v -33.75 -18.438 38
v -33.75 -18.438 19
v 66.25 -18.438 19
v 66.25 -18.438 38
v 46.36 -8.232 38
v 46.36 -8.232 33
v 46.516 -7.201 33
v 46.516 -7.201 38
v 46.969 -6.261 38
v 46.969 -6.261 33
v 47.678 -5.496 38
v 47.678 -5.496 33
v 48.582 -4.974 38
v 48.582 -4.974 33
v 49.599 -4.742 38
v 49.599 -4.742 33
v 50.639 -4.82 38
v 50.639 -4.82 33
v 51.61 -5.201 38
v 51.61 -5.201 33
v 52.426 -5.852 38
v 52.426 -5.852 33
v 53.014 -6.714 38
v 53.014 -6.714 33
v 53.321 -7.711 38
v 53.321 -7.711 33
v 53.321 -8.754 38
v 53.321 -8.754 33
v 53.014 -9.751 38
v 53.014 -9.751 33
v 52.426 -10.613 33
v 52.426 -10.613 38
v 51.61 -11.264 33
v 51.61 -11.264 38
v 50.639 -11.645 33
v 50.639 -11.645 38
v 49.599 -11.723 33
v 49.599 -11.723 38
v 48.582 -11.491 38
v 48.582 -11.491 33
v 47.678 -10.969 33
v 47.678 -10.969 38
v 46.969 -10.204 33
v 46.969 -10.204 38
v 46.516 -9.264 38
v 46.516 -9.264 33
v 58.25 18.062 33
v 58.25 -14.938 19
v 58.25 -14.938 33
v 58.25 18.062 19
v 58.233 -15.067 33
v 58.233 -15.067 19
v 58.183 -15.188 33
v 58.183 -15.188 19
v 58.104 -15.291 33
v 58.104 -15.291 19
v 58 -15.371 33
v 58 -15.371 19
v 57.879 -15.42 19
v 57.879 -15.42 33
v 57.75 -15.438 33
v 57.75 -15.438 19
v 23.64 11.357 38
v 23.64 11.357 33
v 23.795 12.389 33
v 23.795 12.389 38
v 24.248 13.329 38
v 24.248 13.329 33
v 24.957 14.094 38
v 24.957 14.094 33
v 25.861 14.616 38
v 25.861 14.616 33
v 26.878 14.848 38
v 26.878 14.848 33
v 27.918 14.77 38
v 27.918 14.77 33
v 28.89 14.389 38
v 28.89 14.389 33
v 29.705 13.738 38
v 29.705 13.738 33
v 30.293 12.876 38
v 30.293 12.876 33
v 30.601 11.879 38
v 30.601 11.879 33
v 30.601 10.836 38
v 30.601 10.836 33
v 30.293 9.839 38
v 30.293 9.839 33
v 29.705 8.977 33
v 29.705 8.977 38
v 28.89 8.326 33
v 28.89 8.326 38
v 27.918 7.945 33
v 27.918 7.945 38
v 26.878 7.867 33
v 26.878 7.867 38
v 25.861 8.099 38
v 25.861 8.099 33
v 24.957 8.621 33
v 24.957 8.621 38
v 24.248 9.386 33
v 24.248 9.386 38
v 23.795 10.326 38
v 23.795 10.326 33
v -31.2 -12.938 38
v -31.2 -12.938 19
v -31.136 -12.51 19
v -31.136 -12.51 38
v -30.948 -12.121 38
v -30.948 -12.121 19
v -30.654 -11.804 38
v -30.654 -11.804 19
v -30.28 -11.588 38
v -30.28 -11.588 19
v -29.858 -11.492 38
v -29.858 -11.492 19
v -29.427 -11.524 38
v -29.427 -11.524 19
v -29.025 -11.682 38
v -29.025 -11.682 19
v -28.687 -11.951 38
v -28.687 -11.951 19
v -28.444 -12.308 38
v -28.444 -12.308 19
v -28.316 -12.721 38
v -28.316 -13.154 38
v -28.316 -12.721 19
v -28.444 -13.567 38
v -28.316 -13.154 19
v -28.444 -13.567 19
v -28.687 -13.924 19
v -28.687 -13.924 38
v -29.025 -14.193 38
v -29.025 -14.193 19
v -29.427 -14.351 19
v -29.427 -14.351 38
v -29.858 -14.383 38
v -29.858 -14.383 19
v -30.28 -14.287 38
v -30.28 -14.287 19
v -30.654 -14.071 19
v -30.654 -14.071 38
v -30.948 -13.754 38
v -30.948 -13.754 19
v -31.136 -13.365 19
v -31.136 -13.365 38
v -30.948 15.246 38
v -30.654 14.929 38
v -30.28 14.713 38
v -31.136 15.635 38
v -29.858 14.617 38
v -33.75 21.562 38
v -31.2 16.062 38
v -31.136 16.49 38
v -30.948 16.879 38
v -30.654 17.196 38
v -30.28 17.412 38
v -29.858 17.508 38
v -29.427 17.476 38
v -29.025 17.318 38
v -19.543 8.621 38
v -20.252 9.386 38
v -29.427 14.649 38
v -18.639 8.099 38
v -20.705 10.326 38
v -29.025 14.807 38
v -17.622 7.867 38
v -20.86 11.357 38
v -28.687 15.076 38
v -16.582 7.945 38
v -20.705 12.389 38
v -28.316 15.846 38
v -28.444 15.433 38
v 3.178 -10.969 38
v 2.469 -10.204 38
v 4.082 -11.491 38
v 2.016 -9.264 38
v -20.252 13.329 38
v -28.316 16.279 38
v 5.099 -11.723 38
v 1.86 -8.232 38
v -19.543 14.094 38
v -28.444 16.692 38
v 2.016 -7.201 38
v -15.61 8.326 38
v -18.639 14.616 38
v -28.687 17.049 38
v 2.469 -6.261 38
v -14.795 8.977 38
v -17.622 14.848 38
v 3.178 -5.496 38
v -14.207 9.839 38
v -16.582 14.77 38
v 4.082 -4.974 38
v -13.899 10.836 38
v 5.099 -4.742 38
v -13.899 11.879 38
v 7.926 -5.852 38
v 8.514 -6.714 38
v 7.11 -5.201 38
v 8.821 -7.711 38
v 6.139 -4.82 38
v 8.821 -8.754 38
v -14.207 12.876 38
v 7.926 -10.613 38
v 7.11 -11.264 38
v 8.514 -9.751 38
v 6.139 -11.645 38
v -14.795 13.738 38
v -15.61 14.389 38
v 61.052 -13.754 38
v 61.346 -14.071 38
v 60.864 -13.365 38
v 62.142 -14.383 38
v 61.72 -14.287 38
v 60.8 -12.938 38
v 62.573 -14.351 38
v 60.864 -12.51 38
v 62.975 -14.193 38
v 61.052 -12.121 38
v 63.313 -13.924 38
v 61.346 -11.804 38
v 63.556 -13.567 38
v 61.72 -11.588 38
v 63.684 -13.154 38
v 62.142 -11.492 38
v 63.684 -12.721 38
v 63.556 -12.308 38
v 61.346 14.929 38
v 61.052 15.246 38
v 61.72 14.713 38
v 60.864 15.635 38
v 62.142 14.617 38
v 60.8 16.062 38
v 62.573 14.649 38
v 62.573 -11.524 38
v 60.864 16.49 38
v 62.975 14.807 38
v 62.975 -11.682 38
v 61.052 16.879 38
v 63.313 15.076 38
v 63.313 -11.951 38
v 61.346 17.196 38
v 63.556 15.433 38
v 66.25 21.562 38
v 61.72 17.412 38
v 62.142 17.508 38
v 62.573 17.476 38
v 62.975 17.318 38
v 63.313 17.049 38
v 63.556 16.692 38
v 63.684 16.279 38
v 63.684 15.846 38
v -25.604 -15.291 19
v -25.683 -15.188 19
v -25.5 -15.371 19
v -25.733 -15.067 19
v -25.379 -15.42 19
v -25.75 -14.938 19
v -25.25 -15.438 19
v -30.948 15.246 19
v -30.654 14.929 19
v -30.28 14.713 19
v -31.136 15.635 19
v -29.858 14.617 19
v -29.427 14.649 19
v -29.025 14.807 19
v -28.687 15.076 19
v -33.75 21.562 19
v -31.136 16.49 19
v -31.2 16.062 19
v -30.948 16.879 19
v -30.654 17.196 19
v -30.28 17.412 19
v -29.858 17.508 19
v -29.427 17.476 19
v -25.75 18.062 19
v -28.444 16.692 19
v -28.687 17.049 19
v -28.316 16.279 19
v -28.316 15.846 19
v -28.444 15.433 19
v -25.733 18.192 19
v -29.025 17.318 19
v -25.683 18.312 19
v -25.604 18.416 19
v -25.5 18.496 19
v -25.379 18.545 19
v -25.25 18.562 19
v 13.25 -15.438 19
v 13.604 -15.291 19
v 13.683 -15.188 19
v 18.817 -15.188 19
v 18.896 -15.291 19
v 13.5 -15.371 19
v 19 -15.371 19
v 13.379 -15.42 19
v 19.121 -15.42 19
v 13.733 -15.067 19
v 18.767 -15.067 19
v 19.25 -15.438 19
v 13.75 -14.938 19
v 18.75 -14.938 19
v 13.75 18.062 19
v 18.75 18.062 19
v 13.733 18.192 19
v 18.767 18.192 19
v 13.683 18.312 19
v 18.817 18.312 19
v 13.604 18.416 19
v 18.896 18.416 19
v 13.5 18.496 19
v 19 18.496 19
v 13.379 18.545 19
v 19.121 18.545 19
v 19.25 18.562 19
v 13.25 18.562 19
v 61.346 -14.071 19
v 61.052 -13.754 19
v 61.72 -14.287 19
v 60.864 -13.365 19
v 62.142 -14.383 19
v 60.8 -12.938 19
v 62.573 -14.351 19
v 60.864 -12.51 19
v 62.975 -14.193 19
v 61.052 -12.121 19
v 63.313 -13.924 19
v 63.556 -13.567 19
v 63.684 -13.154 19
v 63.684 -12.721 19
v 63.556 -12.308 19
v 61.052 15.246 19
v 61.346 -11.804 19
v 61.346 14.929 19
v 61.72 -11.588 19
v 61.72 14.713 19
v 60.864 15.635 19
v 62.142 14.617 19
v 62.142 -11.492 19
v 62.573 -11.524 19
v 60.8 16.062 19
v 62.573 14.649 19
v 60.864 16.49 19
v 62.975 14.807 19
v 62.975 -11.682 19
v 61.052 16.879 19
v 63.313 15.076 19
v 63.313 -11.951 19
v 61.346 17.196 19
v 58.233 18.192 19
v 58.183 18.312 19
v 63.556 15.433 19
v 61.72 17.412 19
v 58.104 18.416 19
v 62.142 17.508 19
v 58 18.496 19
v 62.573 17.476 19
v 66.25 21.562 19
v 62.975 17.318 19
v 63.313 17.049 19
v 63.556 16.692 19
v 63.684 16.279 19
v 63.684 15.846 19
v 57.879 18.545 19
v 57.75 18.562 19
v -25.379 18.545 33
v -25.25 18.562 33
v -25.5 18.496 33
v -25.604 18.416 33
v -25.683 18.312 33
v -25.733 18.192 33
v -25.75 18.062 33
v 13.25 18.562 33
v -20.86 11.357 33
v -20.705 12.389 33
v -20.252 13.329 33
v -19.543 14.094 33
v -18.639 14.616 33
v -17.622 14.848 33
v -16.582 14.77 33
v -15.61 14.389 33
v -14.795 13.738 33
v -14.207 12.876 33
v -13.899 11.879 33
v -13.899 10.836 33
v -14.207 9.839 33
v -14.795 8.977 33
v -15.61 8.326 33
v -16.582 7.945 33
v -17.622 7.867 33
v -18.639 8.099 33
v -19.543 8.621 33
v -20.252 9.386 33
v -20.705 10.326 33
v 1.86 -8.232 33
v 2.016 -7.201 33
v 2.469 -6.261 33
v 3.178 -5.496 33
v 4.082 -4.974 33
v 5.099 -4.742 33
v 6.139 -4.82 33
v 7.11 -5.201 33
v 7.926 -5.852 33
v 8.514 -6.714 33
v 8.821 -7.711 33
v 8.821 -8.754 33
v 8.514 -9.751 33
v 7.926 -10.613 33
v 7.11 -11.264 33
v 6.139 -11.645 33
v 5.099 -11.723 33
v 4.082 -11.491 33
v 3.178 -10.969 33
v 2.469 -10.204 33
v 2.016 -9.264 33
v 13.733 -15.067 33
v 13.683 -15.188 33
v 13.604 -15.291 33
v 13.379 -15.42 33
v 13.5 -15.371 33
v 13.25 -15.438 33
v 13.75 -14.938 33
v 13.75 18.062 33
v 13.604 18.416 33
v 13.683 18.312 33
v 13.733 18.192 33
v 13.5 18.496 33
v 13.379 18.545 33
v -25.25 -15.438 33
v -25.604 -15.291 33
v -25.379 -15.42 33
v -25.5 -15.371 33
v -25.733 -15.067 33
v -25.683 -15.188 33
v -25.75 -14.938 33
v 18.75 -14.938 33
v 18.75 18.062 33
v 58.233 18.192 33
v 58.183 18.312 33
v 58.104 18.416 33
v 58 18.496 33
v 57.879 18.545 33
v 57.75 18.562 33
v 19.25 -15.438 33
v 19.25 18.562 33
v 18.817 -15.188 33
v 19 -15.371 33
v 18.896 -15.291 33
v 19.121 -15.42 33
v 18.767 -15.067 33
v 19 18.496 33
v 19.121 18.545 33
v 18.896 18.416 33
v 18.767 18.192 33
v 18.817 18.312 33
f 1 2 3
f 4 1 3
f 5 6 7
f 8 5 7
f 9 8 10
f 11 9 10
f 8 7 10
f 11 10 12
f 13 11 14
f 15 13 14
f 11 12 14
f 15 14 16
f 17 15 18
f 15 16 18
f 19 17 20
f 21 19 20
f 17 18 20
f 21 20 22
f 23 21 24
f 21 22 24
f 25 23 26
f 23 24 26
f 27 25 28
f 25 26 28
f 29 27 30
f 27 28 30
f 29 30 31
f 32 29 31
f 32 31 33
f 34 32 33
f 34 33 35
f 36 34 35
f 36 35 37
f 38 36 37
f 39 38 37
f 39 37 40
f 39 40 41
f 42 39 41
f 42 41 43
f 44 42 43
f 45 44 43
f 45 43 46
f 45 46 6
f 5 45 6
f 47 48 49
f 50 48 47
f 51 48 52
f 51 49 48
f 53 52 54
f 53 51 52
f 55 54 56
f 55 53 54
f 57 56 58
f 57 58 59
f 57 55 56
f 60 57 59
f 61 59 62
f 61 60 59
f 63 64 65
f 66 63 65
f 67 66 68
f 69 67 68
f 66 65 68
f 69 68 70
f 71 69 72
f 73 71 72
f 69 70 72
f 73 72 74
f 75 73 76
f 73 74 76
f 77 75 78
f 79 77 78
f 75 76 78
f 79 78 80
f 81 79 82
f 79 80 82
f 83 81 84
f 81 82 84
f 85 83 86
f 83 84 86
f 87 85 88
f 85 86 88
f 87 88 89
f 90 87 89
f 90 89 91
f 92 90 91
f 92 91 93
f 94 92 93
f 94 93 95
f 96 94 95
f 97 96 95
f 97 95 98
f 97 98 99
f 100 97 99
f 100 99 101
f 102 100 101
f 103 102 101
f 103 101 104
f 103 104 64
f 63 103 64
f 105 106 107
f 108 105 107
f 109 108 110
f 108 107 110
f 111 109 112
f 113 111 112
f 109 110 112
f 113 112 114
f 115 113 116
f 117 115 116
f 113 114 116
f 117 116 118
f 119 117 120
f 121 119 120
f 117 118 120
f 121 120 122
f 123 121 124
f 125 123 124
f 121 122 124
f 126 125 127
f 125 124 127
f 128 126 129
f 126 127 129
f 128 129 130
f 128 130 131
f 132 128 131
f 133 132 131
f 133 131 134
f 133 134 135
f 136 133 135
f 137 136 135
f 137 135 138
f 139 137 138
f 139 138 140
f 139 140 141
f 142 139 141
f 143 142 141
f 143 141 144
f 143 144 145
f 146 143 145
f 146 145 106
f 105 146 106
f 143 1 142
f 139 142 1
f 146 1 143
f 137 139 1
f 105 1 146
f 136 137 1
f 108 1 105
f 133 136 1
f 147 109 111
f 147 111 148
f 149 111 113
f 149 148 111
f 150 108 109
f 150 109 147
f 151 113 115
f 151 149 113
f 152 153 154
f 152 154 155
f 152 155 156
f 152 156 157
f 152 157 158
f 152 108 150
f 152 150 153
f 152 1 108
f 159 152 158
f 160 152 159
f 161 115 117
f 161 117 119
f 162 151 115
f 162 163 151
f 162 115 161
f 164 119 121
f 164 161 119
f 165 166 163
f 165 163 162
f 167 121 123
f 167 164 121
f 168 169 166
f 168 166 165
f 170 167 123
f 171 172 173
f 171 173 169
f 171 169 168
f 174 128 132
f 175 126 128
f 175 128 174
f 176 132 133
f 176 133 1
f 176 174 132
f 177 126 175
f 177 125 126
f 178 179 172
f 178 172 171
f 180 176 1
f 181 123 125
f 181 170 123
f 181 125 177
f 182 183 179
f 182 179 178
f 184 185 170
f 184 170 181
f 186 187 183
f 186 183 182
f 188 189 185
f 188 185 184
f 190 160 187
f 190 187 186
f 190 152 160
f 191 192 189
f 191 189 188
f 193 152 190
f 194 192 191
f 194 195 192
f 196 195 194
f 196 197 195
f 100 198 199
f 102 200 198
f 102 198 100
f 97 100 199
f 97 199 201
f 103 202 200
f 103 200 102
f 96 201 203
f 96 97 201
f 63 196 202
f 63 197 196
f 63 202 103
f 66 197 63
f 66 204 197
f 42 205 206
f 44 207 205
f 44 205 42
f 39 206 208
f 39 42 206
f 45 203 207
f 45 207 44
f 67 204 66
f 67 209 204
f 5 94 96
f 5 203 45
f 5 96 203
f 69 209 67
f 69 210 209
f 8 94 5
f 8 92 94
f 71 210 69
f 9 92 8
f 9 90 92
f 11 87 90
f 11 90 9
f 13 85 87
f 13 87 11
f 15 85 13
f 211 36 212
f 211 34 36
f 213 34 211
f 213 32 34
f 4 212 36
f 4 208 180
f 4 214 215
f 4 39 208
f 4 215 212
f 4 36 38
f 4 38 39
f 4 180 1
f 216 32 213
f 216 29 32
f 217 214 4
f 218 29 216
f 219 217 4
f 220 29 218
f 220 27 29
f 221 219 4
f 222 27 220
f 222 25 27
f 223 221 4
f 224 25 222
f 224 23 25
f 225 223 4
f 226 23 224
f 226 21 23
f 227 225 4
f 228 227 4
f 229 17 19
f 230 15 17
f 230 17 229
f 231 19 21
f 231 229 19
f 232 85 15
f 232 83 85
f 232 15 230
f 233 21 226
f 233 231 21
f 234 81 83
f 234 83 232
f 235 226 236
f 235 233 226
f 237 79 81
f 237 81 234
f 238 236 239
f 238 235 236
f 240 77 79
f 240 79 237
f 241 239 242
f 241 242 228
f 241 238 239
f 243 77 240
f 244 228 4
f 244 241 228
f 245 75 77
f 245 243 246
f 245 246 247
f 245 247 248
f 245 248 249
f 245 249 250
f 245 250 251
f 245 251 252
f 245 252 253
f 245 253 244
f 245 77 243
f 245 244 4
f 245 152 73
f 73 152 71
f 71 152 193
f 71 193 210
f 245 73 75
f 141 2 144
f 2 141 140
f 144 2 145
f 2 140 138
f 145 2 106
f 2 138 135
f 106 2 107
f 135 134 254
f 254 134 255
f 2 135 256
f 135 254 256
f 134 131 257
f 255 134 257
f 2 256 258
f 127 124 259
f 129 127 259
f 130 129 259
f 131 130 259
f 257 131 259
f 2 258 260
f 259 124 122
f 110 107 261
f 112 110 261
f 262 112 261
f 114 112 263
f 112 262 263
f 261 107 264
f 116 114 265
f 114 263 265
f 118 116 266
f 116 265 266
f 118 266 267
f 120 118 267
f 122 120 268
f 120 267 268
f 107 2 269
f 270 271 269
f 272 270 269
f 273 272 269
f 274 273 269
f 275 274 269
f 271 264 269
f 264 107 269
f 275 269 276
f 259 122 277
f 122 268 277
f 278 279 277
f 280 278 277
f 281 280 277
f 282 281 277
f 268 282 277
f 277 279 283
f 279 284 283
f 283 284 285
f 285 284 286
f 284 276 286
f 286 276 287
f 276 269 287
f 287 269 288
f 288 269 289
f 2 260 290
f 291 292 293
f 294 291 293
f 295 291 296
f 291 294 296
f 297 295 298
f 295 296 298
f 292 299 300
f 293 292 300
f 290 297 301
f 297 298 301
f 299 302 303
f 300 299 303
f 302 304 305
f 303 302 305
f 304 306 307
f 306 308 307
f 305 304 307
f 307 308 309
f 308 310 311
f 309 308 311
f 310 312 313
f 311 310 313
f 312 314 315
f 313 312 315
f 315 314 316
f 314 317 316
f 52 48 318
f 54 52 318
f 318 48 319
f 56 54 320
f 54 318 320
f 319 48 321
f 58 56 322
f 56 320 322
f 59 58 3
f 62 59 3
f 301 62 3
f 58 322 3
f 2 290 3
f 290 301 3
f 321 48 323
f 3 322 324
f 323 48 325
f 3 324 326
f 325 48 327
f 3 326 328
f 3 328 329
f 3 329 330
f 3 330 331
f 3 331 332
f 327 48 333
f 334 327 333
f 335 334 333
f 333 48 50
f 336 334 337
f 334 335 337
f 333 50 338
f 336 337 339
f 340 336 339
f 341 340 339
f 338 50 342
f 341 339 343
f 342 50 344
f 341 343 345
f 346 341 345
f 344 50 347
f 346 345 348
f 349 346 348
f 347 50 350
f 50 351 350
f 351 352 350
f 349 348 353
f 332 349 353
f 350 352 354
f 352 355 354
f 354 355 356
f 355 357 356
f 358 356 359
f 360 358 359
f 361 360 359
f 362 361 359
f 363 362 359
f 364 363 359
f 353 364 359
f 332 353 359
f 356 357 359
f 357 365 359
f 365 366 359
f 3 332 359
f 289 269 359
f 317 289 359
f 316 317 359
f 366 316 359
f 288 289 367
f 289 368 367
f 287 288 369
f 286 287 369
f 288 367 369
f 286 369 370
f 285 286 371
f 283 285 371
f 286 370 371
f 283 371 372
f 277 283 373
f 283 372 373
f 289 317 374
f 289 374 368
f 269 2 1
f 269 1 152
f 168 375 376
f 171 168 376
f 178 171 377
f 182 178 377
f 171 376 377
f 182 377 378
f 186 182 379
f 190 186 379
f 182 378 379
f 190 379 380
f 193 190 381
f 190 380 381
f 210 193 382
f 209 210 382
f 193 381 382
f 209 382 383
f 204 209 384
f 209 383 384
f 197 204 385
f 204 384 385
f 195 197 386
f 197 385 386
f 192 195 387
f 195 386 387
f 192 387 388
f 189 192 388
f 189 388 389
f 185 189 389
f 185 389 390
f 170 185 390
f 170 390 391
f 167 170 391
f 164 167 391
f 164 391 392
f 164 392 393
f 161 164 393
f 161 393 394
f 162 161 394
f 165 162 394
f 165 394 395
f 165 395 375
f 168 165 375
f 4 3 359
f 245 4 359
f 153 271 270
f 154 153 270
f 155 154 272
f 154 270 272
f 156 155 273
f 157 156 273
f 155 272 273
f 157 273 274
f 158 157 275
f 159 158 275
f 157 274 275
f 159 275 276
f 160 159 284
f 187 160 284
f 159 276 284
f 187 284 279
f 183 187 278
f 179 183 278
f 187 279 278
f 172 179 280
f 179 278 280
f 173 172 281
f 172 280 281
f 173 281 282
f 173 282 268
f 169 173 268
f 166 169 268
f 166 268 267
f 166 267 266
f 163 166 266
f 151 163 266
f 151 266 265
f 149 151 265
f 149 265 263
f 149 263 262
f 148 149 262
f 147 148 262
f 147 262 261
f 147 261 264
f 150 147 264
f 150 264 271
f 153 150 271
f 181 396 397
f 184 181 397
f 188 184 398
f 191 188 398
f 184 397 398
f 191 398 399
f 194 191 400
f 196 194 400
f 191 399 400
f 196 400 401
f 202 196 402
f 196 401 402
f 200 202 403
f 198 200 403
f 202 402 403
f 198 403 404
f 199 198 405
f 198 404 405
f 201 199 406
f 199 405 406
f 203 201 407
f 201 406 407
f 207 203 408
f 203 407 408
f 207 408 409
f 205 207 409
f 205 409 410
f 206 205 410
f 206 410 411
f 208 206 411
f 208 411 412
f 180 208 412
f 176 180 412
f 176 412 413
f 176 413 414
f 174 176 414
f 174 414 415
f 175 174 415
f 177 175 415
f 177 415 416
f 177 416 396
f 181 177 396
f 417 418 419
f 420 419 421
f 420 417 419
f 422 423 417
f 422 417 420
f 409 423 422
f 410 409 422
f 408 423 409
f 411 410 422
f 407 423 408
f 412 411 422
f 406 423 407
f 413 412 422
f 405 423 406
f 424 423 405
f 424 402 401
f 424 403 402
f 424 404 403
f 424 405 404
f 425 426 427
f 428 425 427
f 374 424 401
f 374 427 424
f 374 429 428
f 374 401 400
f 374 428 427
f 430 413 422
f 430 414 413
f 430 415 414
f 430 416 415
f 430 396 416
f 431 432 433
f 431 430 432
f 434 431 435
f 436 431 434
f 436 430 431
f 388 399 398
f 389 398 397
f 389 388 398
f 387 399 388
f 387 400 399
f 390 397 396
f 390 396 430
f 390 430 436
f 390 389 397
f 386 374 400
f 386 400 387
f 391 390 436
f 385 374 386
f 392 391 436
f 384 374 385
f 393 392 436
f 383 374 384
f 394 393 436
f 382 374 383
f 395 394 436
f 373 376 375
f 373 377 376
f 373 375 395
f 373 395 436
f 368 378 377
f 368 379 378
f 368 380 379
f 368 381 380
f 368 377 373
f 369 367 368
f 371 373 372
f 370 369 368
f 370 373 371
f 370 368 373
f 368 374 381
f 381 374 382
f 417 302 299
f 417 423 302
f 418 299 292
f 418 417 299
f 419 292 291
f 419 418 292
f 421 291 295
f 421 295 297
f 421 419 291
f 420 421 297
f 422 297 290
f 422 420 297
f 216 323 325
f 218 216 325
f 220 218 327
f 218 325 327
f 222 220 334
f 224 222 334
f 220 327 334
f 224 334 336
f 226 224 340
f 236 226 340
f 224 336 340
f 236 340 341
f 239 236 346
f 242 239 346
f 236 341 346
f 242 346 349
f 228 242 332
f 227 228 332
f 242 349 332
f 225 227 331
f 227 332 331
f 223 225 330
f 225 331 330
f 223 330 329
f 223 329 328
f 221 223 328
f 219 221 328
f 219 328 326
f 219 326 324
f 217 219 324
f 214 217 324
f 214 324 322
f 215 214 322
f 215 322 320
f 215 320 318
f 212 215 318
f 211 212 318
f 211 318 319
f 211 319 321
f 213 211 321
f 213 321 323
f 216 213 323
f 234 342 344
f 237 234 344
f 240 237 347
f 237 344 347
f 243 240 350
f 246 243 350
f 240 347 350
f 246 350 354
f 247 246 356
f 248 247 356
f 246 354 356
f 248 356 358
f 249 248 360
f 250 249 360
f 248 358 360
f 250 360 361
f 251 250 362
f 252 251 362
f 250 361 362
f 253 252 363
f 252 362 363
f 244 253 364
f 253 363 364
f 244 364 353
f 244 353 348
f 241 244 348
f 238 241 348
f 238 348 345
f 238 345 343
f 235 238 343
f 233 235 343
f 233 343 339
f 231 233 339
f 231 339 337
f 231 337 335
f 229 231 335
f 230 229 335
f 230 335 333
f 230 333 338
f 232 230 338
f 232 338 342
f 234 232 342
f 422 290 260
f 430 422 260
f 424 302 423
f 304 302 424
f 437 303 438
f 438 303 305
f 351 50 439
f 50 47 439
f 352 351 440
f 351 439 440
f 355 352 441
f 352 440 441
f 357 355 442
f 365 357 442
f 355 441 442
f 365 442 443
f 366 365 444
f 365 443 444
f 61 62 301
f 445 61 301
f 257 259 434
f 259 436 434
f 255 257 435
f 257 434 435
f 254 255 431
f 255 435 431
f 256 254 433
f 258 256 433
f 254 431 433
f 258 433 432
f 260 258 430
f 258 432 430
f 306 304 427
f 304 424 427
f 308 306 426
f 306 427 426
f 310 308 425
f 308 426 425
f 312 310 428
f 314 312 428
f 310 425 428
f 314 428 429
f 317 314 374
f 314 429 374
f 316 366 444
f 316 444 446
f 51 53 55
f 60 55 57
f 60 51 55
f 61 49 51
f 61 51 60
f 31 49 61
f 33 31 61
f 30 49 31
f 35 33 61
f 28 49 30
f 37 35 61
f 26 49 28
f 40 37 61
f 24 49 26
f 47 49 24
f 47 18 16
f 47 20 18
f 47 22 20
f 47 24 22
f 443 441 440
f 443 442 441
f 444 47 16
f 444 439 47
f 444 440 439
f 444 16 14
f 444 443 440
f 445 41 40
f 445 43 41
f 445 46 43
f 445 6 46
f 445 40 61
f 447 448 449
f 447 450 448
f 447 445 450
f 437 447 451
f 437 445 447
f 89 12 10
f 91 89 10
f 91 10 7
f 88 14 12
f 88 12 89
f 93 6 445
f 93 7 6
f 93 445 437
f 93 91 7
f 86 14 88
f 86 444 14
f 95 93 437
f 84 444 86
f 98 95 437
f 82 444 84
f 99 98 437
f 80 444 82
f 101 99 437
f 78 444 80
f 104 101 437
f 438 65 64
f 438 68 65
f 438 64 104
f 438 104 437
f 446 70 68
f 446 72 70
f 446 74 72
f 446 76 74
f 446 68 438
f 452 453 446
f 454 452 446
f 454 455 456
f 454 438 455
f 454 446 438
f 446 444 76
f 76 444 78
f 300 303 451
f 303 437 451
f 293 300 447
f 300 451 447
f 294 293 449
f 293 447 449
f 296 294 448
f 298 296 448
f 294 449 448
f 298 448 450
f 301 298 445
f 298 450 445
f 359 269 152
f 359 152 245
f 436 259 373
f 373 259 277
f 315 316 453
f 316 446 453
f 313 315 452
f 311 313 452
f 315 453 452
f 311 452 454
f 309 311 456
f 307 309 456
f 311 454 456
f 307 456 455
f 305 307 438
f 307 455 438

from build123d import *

# Parameters (mm, degrees)
SKETCH1_W           = 100
SKETCH1_H           = 40
BOSS_EXTRUDE1_DEPTH = 38
CUT_EXTRUDE2_START  = -12
SKETCH2_W           = 39.5
SKETCH2_H           = 34
CUT_EXTRUDE2_DEPTH  = 21
CUT_EXTRUDE3_DEPTH  = 9
CUT_EXTRUDE4_REACH  = 81.36
SKETCH4_R           = 1.45
SKETCH5_W           = 100
SKETCH5_H           = 19
CUT_EXTRUDE5_DEPTH  = 87.215210375
FILLET1_R           = 0.5
CUT_EXTRUDE11_REACH = 73.063
SKETCH10_R          = 3.5


with BuildPart() as part:
    # Sketch1 → Boss-Extrude1 (new body)
    with BuildSketch(Plane.XY):
        with Locations((16.25, 1.5625)):
            Rectangle(SKETCH1_W, SKETCH1_H)
    extrude(amount=BOSS_EXTRUDE1_DEPTH)

    # Sketch2 → Cut-Extrude2 (cut)
    with BuildSketch(Plane(origin=(0, 0, 0), x_dir=(-1, 0, 0), z_dir=(0, 0, -1)).offset(CUT_EXTRUDE2_START)):
        with Locations((-38.5, 1.5625)):
            Rectangle(SKETCH2_W, SKETCH2_H)
        with Locations((6, 1.5625)):
            Rectangle(SKETCH2_W, SKETCH2_H)
    extrude(amount=-CUT_EXTRUDE2_DEPTH, mode=Mode.SUBTRACT)

    # Sketch3 → Cut-Extrude3 (cut)
    with BuildSketch(Plane(origin=(-3.362318072, 0, 0), x_dir=(-1, 0, 0), z_dir=(0, 0, -1))):
        with BuildLine():
            ThreePointArc((-61.593370612, 1.614325749), (-20.676836723, -17.421621422), (21.715969185, -1.949710178))
            ThreePointArc((21.715969185, -1.949710178), (22.204299442, 9.465009595), (10.78957967, 9.953339852))
            ThreePointArc((10.78957967, 9.953339852), (-19.986233449, -1.278769909), (-49.690320582, 12.540715264))
            ThreePointArc((-49.690320582, 12.540715264), (-61.105040355, 13.029045522), (-61.593370612, 1.614325749))
        make_face()
    extrude(amount=-CUT_EXTRUDE3_DEPTH, mode=Mode.SUBTRACT)

    # Sketch4 → Cut-Extrude4 (cut, up to next)
    with BuildSketch(Plane(origin=(0, 0, 0), x_dir=(-1, 0, 0), z_dir=(0, 0, -1)), mode=Mode.PRIVATE) as cut_extrude4_sk1:
        with Locations((-62.25, 16.0625)):
            Circle(SKETCH4_R)
    cut_extrude4_tool1 = extrude(cut_extrude4_sk1.sketch, amount=-CUT_EXTRUDE4_REACH, mode=Mode.PRIVATE) & part.part
    # Sketch4 → Cut-Extrude4 (cut, up to next)
    with BuildSketch(Plane(origin=(0, 0, 0), x_dir=(-1, 0, 0), z_dir=(0, 0, -1)), mode=Mode.PRIVATE) as cut_extrude4_sk2:
        with Locations((-62.25, -12.9375)):
            Circle(SKETCH4_R)
    cut_extrude4_tool2 = extrude(cut_extrude4_sk2.sketch, amount=-CUT_EXTRUDE4_REACH, mode=Mode.PRIVATE) & part.part
    # Sketch4 → Cut-Extrude4 (cut, up to next)
    with BuildSketch(Plane(origin=(0, 0, 0), x_dir=(-1, 0, 0), z_dir=(0, 0, -1)), mode=Mode.PRIVATE) as cut_extrude4_sk3:
        with Locations((29.75, 16.0625)):
            Circle(SKETCH4_R)
    cut_extrude4_tool3 = extrude(cut_extrude4_sk3.sketch, amount=-CUT_EXTRUDE4_REACH, mode=Mode.PRIVATE) & part.part
    # Sketch4 → Cut-Extrude4 (cut, up to next)
    with BuildSketch(Plane(origin=(0, 0, 0), x_dir=(-1, 0, 0), z_dir=(0, 0, -1)), mode=Mode.PRIVATE) as cut_extrude4_sk4:
        with Locations((29.75, -12.9375)):
            Circle(SKETCH4_R)
    cut_extrude4_tool4 = extrude(cut_extrude4_sk4.sketch, amount=-CUT_EXTRUDE4_REACH, mode=Mode.PRIVATE) & part.part
    add(cut_extrude4_tool1.solids().sort_by_distance((62.25, 16.0625, 0))[0], mode=Mode.SUBTRACT)
    add(cut_extrude4_tool2.solids().sort_by_distance((62.25, -12.9375, 0))[0], mode=Mode.SUBTRACT)
    add(cut_extrude4_tool3.solids().sort_by_distance((-29.75, 16.0625, 0))[0], mode=Mode.SUBTRACT)
    add(cut_extrude4_tool4.solids().sort_by_distance((-29.75, -12.9375, 0))[0], mode=Mode.SUBTRACT)

    # Sketch5 → Cut-Extrude5 (cut, through all)
    with BuildSketch(Plane(origin=(0, 21.5625, 0), x_dir=(1, 0, 0), z_dir=(0, 1, 0))):
        with Locations((16.25, -9.5)):
            Rectangle(SKETCH5_W, SKETCH5_H)
    extrude(amount=-CUT_EXTRUDE5_DEPTH, mode=Mode.SUBTRACT)

    # Fillet1
    fillet1_edges = [part.edges().sort_by_distance(p)[0] for p in [
        (58.25, 18.5625, 26),
        (18.75, 18.5625, 26),
        (18.75, -15.4375, 26),
        (58.25, -15.4375, 26),
        (13.75, 18.5625, 26),
        (-25.75, 18.5625, 26),
        (-25.75, -15.4375, 26),
        (13.75, -15.4375, 26),
    ]]
    fillet(fillet1_edges, radius=FILLET1_R)

    # Sketch10 → Cut-Extrude11 (cut, up to next)
    with BuildSketch(Plane(origin=(0, 0, 33), x_dir=(-1, 0, 0), z_dir=(0, 0, -1)), mode=Mode.PRIVATE) as cut_extrude11_sk1:
        with Locations((-49.860388068, -8.232477434)):
            Circle(SKETCH10_R)
    cut_extrude11_tool1 = extrude(cut_extrude11_sk1.sketch, amount=-CUT_EXTRUDE11_REACH, mode=Mode.PRIVATE) & part.part
    # Sketch10 → Cut-Extrude11 (cut, up to next)
    with BuildSketch(Plane(origin=(0, 0, 33), x_dir=(-1, 0, 0), z_dir=(0, 0, -1)), mode=Mode.PRIVATE) as cut_extrude11_sk2:
        with Locations((-27.139611932, 11.357477434)):
            Circle(SKETCH10_R)
    cut_extrude11_tool2 = extrude(cut_extrude11_sk2.sketch, amount=-CUT_EXTRUDE11_REACH, mode=Mode.PRIVATE) & part.part
    # Sketch10 → Cut-Extrude11 (cut, up to next)
    with BuildSketch(Plane(origin=(0, 0, 33), x_dir=(-1, 0, 0), z_dir=(0, 0, -1)), mode=Mode.PRIVATE) as cut_extrude11_sk3:
        with Locations((-5.360388068, -8.232477434)):
            Circle(SKETCH10_R)
    cut_extrude11_tool3 = extrude(cut_extrude11_sk3.sketch, amount=-CUT_EXTRUDE11_REACH, mode=Mode.PRIVATE) & part.part
    # Sketch10 → Cut-Extrude11 (cut, up to next)
    with BuildSketch(Plane(origin=(0, 0, 33), x_dir=(-1, 0, 0), z_dir=(0, 0, -1)), mode=Mode.PRIVATE) as cut_extrude11_sk4:
        with Locations((17.360388068, 11.357477434)):
            Circle(SKETCH10_R)
    cut_extrude11_tool4 = extrude(cut_extrude11_sk4.sketch, amount=-CUT_EXTRUDE11_REACH, mode=Mode.PRIVATE) & part.part
    add(cut_extrude11_tool1.solids().sort_by_distance((49.860388, -8.232477, 33))[0], mode=Mode.SUBTRACT)
    add(cut_extrude11_tool2.solids().sort_by_distance((27.139612, 11.357477, 33))[0], mode=Mode.SUBTRACT)
    add(cut_extrude11_tool3.solids().sort_by_distance((5.360388, -8.232477, 33))[0], mode=Mode.SUBTRACT)
    add(cut_extrude11_tool4.solids().sort_by_distance((-17.360388, 11.357477, 33))[0], mode=Mode.SUBTRACT)


solid = part.part
